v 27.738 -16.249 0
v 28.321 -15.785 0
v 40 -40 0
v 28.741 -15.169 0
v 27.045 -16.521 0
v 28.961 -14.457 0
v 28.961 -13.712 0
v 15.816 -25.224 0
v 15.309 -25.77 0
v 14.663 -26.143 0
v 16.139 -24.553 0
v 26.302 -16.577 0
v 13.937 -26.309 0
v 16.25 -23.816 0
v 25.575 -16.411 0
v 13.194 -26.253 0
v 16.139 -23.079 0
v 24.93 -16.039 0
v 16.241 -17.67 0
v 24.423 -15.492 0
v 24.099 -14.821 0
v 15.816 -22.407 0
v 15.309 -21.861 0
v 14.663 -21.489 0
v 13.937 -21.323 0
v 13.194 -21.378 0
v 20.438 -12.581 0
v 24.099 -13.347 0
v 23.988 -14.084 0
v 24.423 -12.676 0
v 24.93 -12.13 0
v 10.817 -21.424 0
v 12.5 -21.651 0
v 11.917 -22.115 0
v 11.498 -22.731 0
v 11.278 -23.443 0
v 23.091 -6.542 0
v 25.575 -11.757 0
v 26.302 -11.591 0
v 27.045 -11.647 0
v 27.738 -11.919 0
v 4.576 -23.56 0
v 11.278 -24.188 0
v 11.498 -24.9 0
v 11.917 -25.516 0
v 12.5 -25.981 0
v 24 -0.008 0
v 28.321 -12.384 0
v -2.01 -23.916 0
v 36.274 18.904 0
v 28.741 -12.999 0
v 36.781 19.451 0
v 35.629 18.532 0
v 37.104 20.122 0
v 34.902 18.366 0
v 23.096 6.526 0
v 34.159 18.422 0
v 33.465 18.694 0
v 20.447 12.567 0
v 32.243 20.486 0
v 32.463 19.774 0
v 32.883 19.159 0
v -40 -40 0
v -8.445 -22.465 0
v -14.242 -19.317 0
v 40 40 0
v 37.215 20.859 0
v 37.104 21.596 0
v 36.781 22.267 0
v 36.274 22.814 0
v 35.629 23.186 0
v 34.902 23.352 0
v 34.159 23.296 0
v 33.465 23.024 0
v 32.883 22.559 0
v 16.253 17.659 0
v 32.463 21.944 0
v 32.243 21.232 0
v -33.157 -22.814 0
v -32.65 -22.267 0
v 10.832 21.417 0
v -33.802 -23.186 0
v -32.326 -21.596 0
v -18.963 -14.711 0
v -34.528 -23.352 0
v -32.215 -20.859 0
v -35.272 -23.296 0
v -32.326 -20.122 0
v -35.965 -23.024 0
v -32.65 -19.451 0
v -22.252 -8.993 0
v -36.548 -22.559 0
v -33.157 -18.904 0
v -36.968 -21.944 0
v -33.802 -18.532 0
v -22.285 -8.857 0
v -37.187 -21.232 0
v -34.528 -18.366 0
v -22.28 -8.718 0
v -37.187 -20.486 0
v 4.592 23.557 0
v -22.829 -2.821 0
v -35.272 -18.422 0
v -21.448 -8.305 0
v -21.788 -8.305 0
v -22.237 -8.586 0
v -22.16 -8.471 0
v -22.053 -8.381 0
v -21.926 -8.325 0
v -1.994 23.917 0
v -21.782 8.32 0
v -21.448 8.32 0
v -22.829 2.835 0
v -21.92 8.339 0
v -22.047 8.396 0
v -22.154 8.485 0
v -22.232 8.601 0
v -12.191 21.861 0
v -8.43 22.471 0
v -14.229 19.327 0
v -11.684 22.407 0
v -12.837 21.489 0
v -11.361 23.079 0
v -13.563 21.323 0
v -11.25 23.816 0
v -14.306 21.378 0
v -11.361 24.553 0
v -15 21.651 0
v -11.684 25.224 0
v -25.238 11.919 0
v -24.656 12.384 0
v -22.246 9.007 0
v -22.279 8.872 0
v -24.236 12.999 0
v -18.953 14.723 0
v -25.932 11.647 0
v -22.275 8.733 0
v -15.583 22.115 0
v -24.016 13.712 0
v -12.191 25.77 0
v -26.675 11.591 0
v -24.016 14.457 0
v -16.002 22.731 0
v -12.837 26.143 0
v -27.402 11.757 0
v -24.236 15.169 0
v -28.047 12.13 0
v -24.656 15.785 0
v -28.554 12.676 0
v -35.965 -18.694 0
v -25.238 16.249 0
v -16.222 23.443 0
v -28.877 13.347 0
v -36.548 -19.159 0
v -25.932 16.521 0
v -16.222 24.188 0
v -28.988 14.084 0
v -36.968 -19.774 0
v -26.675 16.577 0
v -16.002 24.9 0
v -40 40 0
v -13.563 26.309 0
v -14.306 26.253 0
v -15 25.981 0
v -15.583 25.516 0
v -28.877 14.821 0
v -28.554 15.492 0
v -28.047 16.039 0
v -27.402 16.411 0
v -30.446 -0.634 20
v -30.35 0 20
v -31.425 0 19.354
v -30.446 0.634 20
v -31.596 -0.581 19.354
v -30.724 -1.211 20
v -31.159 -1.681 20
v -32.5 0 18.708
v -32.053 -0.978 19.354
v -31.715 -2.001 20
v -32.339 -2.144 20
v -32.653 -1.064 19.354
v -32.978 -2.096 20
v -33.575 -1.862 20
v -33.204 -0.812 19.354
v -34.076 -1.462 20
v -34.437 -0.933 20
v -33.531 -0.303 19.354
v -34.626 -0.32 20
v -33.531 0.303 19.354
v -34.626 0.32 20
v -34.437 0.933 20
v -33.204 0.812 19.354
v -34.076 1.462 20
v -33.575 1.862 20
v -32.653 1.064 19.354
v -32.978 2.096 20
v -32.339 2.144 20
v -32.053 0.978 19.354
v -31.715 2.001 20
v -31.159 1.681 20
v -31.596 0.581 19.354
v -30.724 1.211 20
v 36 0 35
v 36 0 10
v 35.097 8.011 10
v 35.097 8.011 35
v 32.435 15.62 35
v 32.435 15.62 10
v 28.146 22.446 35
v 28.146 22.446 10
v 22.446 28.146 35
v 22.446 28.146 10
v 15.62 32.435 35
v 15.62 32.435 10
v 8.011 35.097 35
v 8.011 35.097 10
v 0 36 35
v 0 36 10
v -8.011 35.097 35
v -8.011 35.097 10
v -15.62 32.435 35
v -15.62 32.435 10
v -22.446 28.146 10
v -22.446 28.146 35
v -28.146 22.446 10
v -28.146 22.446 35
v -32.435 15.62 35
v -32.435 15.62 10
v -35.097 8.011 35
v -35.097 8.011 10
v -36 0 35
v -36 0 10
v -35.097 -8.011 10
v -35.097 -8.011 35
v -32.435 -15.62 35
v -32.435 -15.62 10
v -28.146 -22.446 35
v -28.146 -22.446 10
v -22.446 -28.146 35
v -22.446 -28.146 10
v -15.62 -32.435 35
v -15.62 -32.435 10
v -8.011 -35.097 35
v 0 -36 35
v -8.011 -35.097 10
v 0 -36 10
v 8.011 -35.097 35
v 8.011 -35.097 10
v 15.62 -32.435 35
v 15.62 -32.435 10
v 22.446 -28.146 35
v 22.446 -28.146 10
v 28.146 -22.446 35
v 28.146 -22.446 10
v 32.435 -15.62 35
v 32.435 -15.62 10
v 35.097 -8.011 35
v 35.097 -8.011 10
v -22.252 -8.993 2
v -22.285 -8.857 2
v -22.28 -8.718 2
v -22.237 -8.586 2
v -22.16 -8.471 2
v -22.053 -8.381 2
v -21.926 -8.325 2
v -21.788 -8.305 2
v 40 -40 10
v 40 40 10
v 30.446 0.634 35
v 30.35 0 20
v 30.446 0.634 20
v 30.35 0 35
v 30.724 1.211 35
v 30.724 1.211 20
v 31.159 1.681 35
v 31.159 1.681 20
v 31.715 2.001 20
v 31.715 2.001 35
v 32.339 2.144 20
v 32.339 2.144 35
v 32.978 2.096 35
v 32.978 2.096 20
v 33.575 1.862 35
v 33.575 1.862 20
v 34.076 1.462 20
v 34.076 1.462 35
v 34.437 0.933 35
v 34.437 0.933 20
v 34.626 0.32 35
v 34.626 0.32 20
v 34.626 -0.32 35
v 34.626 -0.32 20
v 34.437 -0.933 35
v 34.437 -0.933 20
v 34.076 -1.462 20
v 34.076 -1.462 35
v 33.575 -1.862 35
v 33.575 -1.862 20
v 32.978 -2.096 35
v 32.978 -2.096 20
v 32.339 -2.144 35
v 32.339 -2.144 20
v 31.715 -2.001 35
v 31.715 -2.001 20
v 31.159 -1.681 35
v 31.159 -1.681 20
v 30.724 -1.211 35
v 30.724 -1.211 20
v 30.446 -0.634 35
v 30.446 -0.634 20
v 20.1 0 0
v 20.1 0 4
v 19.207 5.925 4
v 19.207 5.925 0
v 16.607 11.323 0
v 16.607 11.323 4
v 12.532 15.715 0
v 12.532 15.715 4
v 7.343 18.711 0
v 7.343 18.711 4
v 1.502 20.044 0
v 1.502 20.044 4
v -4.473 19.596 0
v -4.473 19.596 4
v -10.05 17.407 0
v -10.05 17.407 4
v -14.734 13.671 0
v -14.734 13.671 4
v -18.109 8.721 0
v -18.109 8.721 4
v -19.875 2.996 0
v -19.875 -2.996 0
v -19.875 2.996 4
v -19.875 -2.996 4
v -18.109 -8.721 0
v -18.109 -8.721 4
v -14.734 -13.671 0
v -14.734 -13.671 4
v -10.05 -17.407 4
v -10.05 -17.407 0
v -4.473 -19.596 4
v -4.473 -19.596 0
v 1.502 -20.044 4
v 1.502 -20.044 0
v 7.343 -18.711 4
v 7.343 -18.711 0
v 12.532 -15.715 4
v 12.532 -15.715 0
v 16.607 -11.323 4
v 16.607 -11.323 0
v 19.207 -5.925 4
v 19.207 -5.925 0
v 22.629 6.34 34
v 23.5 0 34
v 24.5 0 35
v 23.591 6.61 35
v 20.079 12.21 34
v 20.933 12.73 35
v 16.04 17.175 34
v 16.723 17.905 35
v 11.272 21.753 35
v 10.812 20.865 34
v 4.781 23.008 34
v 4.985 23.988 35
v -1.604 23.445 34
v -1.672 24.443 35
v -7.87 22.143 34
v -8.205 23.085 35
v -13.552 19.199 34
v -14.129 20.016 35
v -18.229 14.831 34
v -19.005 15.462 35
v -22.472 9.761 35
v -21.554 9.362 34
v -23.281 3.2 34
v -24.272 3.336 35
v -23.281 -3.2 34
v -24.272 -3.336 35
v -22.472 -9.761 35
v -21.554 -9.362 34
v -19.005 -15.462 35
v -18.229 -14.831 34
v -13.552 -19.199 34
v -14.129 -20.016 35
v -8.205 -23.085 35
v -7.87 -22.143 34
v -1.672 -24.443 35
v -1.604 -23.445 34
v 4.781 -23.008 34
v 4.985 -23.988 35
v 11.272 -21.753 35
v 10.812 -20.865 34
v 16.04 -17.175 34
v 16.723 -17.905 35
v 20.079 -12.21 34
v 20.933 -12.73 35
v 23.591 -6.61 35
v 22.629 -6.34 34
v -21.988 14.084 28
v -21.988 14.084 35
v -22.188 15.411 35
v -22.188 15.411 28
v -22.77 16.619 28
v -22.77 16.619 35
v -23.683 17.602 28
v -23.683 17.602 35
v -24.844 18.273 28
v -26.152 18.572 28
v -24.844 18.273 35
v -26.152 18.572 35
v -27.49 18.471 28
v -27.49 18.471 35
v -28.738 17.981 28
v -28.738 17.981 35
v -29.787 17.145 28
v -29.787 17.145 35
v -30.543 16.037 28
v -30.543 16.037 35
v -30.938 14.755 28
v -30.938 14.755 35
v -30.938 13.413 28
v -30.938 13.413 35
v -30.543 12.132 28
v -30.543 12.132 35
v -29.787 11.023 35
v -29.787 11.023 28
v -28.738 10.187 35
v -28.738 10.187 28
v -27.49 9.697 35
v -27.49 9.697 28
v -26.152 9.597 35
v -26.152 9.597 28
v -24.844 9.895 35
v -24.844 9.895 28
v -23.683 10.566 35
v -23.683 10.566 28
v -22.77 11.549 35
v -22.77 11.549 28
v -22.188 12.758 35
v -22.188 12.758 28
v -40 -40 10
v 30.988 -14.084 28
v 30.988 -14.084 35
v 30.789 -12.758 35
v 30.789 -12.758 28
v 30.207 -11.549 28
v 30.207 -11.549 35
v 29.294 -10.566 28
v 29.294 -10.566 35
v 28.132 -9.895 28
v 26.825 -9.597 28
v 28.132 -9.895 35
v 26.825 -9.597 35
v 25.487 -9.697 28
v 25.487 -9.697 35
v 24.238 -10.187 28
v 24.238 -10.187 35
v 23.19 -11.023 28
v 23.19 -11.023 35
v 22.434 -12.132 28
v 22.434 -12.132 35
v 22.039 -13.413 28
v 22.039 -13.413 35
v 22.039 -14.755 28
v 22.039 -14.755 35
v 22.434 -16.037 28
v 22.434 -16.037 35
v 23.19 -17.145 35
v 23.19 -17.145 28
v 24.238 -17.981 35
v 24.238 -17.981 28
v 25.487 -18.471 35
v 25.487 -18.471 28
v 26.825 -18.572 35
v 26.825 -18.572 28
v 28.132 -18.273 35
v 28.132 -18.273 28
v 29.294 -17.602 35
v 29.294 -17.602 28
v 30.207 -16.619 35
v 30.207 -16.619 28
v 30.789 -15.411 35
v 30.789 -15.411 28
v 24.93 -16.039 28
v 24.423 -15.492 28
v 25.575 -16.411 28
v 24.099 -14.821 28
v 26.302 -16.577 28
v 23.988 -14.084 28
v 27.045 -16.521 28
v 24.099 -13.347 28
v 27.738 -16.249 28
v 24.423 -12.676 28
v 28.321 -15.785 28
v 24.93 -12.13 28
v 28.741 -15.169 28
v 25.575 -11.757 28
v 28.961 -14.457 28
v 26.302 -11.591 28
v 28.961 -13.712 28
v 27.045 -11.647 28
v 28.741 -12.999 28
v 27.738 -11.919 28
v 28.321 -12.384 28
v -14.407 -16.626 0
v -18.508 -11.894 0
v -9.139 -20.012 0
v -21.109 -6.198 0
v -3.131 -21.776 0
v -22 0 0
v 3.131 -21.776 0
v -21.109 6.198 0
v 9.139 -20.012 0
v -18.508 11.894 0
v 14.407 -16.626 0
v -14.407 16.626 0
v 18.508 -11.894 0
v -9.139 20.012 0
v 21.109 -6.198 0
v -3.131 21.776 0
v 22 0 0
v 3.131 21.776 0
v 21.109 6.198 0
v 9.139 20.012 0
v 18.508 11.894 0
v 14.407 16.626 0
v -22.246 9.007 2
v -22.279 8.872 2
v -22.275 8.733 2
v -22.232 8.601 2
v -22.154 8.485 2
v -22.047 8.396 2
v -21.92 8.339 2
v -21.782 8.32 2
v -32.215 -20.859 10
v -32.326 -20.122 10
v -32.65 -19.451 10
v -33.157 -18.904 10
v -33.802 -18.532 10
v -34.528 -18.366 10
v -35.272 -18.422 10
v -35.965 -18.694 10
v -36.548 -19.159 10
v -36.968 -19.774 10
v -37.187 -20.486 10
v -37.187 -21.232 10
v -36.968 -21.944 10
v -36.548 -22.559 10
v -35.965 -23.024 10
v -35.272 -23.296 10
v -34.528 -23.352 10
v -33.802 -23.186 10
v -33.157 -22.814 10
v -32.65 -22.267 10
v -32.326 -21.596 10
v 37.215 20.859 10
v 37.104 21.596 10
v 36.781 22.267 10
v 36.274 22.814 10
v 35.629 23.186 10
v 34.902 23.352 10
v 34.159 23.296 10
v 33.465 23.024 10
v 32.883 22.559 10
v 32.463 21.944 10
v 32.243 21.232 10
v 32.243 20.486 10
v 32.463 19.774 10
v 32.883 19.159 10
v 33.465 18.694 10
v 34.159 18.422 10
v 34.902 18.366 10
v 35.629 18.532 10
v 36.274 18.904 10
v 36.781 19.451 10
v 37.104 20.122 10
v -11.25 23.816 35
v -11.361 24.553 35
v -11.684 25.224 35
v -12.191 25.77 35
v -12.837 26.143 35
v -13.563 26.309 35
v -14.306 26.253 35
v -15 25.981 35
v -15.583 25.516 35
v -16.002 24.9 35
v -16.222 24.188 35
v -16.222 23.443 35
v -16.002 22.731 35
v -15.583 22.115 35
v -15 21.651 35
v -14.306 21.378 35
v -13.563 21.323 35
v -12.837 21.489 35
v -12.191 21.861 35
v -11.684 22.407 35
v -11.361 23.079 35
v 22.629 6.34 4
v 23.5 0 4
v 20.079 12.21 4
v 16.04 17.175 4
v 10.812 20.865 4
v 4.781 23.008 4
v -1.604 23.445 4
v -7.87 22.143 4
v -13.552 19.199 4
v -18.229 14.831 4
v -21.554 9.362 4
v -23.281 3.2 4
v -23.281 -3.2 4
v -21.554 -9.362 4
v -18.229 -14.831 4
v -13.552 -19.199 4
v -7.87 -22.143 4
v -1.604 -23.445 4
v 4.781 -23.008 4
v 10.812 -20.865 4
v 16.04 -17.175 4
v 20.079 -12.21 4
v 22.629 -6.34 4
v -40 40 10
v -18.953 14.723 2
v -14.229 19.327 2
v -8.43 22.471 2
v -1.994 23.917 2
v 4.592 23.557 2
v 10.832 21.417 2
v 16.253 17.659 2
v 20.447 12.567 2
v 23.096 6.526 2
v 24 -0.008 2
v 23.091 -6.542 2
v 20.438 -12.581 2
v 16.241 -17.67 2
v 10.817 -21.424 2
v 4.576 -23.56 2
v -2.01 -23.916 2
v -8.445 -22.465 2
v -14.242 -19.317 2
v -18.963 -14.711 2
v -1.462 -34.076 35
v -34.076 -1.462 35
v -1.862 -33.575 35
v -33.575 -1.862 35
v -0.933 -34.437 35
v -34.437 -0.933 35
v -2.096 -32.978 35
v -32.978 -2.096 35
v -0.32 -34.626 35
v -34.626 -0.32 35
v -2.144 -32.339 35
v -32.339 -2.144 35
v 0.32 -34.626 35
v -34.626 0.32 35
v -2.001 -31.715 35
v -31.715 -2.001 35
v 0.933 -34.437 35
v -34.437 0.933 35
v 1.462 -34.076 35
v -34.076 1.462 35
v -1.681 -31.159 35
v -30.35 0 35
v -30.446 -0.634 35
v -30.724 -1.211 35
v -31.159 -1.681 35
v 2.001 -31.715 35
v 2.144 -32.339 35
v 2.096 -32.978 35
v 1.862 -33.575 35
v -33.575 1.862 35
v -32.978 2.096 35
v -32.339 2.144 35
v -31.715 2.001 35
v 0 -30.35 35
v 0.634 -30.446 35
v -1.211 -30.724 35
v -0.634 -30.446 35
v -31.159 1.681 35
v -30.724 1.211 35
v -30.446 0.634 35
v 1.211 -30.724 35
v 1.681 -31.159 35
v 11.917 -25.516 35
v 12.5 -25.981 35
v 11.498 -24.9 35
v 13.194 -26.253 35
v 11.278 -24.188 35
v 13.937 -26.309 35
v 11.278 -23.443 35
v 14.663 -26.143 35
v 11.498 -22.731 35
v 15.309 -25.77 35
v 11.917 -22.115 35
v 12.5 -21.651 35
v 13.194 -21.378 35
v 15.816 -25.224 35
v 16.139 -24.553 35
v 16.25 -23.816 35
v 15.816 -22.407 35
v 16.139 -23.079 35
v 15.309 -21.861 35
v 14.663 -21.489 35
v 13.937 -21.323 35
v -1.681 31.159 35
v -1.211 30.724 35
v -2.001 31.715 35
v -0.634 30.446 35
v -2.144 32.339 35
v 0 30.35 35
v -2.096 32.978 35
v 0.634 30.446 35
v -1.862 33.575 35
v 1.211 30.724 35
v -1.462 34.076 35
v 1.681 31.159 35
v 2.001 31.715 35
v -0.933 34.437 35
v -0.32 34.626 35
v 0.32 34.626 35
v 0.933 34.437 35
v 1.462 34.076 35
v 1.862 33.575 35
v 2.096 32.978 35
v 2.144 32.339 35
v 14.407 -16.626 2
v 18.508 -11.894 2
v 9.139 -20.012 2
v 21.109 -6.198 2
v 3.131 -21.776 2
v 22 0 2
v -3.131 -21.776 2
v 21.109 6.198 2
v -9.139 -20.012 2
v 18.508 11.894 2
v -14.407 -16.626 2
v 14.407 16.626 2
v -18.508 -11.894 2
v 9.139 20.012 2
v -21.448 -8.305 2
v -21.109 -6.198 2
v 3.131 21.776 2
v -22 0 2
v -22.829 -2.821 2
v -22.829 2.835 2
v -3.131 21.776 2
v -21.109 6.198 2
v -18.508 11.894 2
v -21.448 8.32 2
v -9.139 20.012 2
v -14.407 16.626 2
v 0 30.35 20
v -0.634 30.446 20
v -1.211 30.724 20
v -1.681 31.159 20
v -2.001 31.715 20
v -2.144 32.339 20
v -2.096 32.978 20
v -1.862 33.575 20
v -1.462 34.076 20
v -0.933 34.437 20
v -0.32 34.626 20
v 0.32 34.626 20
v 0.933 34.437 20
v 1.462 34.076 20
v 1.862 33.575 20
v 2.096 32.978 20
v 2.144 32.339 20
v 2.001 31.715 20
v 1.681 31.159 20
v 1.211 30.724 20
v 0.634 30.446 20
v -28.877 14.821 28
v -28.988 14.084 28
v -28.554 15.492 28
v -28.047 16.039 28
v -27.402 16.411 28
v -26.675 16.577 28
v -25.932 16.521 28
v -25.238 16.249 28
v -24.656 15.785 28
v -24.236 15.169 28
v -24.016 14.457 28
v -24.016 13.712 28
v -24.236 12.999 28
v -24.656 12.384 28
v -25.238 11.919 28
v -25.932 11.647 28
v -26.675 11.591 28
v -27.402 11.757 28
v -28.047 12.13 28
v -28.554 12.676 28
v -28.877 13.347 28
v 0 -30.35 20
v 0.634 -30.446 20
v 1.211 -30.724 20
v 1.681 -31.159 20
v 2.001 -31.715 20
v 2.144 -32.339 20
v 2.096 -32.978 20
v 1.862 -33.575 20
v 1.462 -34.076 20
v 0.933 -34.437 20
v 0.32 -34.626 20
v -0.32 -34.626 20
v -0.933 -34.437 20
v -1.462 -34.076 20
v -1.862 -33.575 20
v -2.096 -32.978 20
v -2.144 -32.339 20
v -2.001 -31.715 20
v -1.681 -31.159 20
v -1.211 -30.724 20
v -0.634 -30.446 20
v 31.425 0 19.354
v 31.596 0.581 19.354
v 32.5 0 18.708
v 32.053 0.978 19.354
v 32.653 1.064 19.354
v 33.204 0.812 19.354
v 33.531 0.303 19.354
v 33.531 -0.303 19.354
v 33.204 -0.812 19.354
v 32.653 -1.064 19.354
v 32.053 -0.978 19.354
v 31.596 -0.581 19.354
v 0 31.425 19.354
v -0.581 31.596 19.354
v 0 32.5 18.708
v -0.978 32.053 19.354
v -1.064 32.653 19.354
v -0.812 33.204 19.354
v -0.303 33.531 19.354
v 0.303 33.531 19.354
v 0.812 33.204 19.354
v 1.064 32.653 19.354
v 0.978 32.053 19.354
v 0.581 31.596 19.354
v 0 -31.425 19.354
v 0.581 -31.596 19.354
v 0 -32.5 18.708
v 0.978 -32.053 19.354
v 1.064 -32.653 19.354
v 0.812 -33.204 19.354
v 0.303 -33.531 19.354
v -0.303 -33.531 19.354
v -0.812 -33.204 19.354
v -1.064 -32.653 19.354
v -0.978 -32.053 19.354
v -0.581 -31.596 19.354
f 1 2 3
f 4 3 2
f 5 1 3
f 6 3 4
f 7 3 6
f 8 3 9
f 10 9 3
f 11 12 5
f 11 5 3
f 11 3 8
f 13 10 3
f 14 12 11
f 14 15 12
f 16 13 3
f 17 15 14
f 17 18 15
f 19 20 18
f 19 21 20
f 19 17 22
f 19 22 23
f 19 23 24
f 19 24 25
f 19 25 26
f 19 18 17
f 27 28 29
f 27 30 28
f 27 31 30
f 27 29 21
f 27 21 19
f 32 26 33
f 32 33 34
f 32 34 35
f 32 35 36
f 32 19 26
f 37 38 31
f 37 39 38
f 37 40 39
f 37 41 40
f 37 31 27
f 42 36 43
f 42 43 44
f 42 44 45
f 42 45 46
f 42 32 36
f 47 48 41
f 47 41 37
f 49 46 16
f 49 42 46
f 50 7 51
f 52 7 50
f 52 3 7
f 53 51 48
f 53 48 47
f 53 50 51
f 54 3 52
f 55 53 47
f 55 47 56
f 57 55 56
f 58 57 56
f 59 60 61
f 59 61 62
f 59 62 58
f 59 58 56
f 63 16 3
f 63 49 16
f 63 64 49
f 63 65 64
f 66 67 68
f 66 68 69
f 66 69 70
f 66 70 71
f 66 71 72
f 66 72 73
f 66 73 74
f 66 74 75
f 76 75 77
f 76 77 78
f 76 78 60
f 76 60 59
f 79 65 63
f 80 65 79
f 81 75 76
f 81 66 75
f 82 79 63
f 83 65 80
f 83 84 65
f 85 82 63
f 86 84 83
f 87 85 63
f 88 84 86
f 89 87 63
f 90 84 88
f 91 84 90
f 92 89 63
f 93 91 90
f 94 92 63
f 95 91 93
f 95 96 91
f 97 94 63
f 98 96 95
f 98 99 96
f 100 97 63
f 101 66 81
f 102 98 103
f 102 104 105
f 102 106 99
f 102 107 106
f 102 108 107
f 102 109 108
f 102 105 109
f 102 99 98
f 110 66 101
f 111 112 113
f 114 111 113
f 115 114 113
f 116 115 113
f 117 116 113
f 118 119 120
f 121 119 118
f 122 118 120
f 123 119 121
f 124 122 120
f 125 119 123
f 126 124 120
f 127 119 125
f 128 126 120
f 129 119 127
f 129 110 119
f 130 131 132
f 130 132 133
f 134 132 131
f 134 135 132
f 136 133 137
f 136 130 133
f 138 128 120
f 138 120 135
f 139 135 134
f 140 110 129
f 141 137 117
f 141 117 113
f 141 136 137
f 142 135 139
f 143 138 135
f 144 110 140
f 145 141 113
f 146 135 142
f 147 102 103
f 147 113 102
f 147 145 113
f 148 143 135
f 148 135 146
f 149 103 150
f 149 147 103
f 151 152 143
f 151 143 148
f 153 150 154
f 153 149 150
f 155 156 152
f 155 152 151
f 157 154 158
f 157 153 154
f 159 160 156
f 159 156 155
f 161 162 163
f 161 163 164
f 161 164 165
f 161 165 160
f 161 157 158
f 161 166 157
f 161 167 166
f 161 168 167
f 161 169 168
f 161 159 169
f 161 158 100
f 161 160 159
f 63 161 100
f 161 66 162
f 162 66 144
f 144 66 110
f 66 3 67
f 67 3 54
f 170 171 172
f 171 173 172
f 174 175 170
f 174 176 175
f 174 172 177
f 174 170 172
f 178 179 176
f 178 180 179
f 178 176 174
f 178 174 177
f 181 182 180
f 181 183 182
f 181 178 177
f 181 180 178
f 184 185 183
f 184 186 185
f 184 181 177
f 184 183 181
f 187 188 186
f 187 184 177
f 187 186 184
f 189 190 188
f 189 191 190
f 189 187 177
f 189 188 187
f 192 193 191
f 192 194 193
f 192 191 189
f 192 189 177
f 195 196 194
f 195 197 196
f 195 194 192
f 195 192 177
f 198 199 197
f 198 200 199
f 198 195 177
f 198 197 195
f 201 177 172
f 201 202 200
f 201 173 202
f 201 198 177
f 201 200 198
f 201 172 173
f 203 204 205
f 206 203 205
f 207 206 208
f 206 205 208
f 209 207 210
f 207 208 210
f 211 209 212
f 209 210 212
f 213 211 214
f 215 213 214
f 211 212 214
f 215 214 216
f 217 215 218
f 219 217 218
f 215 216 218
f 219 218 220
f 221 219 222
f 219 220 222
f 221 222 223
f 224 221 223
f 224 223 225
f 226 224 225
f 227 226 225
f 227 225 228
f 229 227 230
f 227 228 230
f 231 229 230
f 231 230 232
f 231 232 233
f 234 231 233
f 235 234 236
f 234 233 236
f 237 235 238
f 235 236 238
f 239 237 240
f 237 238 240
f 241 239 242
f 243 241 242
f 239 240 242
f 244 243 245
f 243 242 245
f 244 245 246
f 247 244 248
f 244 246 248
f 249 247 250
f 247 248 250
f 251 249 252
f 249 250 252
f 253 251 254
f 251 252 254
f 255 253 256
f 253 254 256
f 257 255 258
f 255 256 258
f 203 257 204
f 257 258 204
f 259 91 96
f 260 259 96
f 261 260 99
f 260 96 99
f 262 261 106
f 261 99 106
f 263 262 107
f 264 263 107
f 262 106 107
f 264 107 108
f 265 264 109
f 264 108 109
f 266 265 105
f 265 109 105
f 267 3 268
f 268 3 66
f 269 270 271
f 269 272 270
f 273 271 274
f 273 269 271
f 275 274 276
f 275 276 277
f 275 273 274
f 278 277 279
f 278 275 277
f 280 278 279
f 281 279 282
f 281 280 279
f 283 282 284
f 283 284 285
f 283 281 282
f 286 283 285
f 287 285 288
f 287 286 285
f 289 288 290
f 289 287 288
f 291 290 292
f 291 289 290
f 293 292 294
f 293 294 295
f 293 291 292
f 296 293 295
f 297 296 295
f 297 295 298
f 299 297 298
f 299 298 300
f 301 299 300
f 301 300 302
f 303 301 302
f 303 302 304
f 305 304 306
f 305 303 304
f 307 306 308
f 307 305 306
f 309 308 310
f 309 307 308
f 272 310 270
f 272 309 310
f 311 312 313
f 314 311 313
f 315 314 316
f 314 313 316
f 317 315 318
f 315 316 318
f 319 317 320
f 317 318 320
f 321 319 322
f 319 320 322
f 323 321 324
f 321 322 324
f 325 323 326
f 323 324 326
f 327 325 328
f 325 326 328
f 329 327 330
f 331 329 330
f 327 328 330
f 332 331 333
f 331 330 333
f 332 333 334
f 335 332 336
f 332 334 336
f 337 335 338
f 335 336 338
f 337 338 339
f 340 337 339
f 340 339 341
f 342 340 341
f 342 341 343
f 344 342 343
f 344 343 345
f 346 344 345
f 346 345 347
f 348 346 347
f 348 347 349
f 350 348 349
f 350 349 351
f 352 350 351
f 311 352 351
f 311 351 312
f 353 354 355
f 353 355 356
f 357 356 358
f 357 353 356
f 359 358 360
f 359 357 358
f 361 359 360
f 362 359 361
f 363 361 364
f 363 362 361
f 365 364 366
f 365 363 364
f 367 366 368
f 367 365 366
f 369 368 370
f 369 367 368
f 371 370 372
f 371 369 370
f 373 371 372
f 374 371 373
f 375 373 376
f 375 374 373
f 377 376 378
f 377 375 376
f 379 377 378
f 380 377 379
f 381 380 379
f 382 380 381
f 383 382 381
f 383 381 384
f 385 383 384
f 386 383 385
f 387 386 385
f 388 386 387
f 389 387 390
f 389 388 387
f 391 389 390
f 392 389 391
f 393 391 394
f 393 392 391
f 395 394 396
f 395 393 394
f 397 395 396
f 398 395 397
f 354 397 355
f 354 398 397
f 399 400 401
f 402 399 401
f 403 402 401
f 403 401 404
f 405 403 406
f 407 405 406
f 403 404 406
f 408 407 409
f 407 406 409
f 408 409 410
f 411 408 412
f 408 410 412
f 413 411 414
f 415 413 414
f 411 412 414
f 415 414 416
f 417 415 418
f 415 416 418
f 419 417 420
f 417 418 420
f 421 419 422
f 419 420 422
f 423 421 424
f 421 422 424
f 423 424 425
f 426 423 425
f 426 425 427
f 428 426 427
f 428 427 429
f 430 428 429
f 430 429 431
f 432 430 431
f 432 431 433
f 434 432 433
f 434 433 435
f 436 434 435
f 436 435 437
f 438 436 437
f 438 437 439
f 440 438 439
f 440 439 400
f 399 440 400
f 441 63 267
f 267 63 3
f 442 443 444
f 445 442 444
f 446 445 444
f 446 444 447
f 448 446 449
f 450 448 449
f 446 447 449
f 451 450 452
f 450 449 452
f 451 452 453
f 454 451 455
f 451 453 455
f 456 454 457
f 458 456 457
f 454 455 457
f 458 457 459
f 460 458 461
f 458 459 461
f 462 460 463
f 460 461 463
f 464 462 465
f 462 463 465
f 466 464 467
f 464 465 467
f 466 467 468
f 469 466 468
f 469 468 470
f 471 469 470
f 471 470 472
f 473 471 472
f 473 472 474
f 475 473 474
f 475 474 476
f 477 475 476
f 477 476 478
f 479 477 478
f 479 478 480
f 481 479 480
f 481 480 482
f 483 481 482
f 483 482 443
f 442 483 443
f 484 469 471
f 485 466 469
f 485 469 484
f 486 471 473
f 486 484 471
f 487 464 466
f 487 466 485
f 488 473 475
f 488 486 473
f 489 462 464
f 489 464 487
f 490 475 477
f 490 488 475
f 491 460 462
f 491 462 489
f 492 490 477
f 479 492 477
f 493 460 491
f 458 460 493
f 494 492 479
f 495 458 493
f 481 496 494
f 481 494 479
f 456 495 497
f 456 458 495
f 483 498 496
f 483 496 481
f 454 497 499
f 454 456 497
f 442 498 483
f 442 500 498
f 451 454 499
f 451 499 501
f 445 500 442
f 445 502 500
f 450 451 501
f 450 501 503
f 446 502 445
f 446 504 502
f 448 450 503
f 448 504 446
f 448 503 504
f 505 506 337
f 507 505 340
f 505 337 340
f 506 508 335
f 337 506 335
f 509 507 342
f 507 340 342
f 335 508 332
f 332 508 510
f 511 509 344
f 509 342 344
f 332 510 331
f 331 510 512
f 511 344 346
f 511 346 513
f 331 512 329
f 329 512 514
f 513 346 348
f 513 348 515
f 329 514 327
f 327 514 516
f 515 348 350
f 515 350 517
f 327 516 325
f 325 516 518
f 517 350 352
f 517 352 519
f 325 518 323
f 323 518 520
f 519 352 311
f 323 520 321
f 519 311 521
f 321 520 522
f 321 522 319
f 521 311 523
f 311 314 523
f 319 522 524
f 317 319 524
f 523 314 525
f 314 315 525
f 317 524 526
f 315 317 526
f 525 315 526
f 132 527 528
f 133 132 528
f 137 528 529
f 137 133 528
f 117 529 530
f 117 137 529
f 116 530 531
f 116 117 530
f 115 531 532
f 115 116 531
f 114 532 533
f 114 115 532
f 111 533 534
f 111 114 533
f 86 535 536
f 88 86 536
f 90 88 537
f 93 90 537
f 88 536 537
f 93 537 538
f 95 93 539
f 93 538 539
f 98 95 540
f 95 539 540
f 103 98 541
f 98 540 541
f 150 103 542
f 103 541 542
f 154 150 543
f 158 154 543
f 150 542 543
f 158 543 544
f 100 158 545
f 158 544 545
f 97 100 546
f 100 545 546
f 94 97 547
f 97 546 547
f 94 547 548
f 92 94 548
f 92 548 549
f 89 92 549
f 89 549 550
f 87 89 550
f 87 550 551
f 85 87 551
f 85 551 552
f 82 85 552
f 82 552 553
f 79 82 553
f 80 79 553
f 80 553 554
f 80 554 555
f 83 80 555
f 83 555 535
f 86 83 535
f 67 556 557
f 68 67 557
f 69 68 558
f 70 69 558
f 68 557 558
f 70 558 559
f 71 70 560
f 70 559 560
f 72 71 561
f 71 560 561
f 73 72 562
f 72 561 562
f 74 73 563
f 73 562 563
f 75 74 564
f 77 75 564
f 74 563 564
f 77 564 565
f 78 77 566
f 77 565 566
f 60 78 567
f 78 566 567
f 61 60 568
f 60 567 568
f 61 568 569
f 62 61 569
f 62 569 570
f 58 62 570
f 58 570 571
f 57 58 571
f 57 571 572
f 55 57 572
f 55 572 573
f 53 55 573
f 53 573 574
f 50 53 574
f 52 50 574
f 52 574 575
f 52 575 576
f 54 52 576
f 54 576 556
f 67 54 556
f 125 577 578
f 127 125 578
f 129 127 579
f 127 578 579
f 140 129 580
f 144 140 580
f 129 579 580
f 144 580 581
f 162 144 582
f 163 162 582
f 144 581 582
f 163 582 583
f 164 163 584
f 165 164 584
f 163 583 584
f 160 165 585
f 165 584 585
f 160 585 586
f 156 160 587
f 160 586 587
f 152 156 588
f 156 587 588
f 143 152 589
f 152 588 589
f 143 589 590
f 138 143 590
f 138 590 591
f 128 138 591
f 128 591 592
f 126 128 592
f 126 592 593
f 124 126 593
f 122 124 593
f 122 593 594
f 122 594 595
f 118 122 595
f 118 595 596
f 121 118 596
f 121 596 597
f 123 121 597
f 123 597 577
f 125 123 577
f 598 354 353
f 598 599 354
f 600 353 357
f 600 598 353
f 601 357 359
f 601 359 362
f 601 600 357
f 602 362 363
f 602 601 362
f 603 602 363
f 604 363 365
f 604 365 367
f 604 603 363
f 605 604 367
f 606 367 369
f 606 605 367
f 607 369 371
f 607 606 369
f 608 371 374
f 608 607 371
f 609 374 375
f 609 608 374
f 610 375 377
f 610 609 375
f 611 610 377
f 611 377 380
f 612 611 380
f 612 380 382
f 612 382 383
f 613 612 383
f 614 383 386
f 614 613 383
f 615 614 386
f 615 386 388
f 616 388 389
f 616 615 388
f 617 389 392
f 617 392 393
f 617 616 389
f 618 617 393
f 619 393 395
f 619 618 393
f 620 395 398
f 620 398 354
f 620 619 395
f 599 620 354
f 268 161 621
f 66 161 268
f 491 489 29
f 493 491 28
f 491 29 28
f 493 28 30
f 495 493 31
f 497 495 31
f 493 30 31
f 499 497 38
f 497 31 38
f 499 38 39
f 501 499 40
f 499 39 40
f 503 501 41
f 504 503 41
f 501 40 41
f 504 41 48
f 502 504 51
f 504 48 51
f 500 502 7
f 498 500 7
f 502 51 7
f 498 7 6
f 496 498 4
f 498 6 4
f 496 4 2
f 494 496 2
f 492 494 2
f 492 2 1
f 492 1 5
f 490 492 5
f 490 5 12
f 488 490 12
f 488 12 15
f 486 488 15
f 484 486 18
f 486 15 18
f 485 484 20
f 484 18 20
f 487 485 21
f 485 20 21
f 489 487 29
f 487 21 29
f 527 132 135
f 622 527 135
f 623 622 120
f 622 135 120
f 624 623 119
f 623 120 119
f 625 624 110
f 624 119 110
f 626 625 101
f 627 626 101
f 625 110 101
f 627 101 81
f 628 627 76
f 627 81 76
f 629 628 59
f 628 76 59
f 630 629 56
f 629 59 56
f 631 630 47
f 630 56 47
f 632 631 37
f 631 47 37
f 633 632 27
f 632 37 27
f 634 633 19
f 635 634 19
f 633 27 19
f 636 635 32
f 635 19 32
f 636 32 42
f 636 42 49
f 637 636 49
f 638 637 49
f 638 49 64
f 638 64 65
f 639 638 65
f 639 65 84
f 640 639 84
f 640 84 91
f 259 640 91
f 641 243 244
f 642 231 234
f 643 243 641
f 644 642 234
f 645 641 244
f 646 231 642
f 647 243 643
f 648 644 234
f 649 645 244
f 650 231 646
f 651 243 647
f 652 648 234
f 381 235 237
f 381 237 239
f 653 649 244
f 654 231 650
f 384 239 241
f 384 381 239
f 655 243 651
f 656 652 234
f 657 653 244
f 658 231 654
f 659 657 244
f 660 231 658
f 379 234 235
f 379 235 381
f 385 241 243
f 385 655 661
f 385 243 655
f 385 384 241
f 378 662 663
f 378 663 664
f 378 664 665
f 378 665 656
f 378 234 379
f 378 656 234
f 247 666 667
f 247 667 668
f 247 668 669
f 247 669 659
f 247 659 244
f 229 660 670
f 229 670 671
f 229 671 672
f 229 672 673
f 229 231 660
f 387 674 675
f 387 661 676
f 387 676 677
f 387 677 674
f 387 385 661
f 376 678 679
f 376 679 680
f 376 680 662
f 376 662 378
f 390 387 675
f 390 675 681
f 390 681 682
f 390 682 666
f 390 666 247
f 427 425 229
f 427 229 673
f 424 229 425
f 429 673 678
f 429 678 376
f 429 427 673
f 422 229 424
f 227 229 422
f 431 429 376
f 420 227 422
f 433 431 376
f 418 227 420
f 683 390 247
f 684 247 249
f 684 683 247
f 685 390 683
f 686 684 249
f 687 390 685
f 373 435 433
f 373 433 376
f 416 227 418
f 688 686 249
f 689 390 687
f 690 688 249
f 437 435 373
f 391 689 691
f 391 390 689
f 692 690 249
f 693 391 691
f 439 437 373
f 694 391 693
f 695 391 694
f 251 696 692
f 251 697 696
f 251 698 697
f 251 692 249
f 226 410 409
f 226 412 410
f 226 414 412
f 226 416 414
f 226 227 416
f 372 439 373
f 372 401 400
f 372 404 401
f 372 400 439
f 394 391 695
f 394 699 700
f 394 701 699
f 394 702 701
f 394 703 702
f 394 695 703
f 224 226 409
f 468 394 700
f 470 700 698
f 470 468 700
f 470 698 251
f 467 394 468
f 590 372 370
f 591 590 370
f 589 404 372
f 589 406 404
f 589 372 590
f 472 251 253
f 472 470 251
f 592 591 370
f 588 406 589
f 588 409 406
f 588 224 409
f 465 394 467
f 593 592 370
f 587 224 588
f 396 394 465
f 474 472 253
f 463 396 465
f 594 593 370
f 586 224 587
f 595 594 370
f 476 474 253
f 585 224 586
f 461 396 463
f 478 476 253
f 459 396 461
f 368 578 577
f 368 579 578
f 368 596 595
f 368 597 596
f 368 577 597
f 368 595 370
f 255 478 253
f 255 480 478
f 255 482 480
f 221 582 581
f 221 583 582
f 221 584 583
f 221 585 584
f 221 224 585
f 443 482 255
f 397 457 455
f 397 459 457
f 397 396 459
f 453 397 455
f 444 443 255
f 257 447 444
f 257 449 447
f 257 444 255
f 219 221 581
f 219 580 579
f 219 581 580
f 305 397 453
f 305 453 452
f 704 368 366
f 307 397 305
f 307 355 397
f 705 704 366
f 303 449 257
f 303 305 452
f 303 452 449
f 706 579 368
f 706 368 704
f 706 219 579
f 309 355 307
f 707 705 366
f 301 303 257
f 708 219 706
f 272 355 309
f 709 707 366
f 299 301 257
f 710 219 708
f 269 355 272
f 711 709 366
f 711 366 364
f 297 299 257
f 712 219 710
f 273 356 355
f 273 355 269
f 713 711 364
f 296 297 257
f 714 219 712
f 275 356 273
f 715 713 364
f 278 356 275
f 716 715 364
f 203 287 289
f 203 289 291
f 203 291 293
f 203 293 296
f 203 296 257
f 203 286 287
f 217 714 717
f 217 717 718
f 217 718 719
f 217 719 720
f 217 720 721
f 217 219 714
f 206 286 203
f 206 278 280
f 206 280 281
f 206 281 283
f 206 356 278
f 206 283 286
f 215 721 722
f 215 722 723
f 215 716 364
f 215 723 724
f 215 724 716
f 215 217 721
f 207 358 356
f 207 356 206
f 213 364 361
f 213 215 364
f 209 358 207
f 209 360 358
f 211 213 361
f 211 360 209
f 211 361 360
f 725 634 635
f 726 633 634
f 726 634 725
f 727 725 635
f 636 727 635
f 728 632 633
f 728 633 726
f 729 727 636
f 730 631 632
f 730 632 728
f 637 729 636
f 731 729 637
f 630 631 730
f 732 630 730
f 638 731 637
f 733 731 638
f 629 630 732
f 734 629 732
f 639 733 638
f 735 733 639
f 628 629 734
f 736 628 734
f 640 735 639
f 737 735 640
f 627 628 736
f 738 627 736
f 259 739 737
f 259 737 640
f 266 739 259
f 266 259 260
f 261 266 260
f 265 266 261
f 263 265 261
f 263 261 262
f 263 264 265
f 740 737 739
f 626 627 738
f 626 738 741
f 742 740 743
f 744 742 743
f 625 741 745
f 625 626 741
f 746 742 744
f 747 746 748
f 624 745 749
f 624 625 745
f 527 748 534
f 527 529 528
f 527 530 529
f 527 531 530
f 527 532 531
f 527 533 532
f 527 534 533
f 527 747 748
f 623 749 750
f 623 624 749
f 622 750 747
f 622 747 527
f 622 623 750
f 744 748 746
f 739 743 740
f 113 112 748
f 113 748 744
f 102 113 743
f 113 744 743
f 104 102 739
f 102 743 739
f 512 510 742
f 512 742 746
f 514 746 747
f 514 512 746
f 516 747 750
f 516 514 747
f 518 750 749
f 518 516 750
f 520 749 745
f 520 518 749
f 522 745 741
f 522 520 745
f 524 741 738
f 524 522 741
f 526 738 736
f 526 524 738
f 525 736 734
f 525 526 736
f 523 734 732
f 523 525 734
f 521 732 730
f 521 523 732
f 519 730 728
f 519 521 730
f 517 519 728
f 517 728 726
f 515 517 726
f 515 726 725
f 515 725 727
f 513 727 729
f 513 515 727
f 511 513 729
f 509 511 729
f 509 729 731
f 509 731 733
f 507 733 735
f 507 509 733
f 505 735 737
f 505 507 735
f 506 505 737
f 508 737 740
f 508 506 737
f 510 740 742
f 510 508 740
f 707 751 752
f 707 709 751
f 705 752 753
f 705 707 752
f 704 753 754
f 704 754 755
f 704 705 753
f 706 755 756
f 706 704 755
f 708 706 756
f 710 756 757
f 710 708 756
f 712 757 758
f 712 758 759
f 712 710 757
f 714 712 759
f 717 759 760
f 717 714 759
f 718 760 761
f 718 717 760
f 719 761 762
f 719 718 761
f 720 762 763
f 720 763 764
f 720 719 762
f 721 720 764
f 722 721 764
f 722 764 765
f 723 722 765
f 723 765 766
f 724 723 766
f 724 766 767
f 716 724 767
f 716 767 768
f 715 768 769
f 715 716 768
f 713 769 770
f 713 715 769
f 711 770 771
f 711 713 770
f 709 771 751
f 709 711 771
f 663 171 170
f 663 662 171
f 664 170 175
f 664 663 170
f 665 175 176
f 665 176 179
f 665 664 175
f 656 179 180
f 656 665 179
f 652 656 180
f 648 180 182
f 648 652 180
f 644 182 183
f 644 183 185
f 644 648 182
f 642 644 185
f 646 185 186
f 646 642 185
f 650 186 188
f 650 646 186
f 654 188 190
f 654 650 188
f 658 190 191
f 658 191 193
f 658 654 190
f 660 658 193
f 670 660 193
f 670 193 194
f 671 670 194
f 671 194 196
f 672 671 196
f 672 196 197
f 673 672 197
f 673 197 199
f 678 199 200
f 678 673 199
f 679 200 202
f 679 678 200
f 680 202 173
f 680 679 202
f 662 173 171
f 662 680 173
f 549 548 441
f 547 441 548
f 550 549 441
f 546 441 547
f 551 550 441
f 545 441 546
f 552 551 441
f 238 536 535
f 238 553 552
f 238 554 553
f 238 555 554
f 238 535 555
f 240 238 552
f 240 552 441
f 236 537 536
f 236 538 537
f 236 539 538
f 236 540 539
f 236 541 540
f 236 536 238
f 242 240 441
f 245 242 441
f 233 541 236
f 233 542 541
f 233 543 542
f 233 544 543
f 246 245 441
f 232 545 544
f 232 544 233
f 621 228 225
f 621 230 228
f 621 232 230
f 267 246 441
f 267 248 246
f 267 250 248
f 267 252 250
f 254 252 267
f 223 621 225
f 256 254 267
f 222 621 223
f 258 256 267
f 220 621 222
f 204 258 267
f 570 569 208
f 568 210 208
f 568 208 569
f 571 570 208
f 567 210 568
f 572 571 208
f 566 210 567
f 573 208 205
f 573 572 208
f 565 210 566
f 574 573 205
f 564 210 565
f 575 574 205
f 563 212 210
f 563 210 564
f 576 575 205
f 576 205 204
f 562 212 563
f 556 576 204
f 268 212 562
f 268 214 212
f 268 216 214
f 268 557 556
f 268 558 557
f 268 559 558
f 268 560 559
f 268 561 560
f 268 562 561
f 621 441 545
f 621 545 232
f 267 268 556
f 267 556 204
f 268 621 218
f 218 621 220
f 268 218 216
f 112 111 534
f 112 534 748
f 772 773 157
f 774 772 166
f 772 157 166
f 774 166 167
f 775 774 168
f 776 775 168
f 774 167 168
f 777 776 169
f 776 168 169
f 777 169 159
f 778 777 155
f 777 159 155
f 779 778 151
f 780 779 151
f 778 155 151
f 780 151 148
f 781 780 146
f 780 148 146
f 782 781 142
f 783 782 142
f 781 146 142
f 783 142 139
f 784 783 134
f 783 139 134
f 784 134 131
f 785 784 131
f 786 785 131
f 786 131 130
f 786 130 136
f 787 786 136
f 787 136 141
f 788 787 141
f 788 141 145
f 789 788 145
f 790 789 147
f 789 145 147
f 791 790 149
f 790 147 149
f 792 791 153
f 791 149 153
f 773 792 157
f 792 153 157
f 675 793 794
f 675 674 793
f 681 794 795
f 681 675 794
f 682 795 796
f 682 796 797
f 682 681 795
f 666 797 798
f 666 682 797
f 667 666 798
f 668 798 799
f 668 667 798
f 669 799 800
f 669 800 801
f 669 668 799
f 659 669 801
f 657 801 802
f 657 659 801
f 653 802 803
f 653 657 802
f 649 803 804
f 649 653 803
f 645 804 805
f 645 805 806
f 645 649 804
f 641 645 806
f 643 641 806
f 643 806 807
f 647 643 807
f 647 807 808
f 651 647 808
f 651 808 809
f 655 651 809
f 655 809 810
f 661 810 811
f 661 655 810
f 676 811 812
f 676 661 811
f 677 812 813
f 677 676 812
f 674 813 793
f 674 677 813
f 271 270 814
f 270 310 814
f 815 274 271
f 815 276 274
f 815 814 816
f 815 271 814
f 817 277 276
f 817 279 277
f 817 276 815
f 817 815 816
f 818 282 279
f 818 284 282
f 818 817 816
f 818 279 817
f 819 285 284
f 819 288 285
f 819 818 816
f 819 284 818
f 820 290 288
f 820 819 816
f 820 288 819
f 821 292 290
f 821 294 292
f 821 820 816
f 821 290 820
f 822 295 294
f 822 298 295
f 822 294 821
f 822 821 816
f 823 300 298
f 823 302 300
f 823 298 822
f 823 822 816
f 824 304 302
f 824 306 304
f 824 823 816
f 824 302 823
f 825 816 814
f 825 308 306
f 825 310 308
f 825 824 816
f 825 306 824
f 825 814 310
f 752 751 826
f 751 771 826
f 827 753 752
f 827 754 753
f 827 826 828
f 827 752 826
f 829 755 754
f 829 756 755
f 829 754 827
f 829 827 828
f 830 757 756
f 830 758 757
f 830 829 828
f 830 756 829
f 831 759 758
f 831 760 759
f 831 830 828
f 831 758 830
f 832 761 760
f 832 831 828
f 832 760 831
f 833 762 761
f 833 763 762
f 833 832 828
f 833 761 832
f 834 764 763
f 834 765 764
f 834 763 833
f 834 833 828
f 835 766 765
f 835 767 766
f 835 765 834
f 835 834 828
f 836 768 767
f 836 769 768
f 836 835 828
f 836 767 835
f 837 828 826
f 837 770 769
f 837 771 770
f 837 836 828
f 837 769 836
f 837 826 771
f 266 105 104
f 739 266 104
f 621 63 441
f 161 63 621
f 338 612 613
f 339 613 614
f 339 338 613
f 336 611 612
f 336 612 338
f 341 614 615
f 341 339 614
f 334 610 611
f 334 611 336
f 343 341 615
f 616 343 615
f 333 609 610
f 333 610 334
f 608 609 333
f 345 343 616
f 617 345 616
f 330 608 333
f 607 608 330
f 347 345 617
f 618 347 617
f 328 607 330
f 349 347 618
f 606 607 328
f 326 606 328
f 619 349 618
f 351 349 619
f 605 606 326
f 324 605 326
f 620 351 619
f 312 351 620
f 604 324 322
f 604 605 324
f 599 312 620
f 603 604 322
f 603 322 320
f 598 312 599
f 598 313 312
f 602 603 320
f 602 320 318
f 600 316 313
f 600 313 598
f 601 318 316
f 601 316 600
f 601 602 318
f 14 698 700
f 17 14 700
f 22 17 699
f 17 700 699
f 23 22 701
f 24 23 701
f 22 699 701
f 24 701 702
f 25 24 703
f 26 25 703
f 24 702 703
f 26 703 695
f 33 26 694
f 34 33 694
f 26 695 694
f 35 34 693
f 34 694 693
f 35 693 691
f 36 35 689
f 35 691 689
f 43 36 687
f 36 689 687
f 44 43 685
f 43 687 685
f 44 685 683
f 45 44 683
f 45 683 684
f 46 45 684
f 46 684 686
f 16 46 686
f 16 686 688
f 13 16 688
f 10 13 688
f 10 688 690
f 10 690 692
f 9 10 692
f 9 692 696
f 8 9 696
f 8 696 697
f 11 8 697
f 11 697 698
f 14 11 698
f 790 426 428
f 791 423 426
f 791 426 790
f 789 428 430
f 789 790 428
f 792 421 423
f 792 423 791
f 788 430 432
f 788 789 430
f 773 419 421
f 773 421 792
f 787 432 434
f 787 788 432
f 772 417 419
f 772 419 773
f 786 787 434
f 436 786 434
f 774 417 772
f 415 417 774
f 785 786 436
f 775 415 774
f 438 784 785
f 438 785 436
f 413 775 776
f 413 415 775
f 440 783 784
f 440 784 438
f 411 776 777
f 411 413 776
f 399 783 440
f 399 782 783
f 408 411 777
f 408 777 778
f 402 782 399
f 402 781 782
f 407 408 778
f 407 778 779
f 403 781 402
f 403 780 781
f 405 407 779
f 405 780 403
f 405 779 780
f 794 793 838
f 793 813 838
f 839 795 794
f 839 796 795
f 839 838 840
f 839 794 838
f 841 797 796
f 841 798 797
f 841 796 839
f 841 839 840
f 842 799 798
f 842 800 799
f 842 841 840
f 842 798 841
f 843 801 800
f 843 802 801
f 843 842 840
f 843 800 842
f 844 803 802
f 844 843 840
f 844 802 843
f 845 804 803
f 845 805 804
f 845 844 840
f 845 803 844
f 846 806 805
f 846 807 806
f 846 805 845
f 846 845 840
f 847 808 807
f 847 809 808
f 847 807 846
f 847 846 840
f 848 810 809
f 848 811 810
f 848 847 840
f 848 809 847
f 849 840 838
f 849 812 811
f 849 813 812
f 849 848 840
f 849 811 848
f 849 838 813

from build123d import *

# Parameters (mm, degrees)
SKIZZE1_W                                            = 80
SKIZZE1_H                                            = 80
AUFSATZ_LINEAR_AUSTRAGEN1_DEPTH                      = 10
SKIZZE16_R                                           = 20.1
SCHNITT_LINEAR_AUSTRAGEN1_DEPTH                      = 11
SKIZZE17_R                                           = 36
SKIZZE17_R_2                                         = 23.5
AUFSATZ_LINEAR_AUSTRAGEN2_DEPTH                      = 25
KREISMUSTER1_COUNT                                   = 4
FASE1_SIZE                                           = 1
F_5_0_5_DURCHMESSER_BOHRUNG1_D                       = 5
STIRNSENKUNG_F_R_M5_ZYLINDERSCHRAUBE_MIT_D           = 5
STIRNSENKUNG_F_R_M5_ZYLINDERSCHRAUBE_MIT_CBORE_D     = 9
STIRNSENKUNG_F_R_M5_ZYLINDERSCHRAUBE_MIT_CBORE_DEPTH = 7
SKIZZE39_R                                           = 23.5
SKIZZE39_R_2                                         = 20.1
SCHNITT_LINEAR_AUSTRAGEN2_DEPTH                      = 6
SKIZZE40_R                                           = 24
SKIZZE40_R_2                                         = 22
SCHNITT_LINEAR_AUSTRAGEN3_DEPTH                      = 2
AUFSATZ_LINEAR_AUSTRAGEN3_DEPTH                      = 2
SCHNITT_LINEAR_AUSTRAGEN4_DEPTH                      = 2


with BuildPart() as part:
    # Skizze1 → Aufsatz-Linear austragen1 (new body)
    with BuildSketch(Plane.XY):
        Rectangle(SKIZZE1_W, SKIZZE1_H)
    extrude(amount=AUFSATZ_LINEAR_AUSTRAGEN1_DEPTH)

    # Skizze16 → Schnitt-Linear austragen1 (cut, through all)
    with BuildSketch(Plane.XY.offset(10)):
        Circle(SKIZZE16_R)
    extrude(amount=-SCHNITT_LINEAR_AUSTRAGEN1_DEPTH, mode=Mode.SUBTRACT)

    # Skizze17 → Aufsatz-Linear austragen2 (add)
    with BuildSketch(Plane.XY.offset(10)):
        Circle(SKIZZE17_R)
        Circle(SKIZZE17_R_2, mode=Mode.SUBTRACT)
    extrude(amount=AUFSATZ_LINEAR_AUSTRAGEN2_DEPTH)

    # Skizze21 → Ø4.3 (4.3) Durchmesser Bohrung1 (revolve, cut)
    with BuildSketch(Plane(origin=(0, 32.5, 35), x_dir=(0, -1, 0), z_dir=(1, 0, 0))):
        Polygon((0, 0), (0, 16.291850331), (2.15, 15), (2.15, 0), align=None)
    f_4_3_4_3_durchmesser_bohrung1 = revolve(axis=Axis((0, 32.5, 41.35), (0, 0, -1)), mode=Mode.SUBTRACT)

    # Kreismuster1: Ø4.3 (4.3) Durchmesser Bohrung1 ×4 about axis
    kreismuster1_axis = Axis((0, 0, 0), (0, 0, 1))
    for i in range(1, KREISMUSTER1_COUNT):
        add(f_4_3_4_3_durchmesser_bohrung1.rotate(kreismuster1_axis, i * 360 / KREISMUSTER1_COUNT), mode=Mode.SUBTRACT)

    # Fase1
    fase1_edges = [part.edges().sort_by_distance(p)[0] for p in [
        (-23.5, 0, 35),
    ]]
    chamfer(fase1_edges, length=FASE1_SIZE)

    # Ø5.0 (5) Durchmesser Bohrung1 (through all)
    with Locations(Plane(origin=(0, 0, 0), x_dir=(-1, 0, 0), z_dir=(0, 0, -1))):
        with Locations((34.715275678, -20.859042034), (-13.75, -23.815698604), (13.75, 23.815698604), (-34.715275678, 20.859042034)):
            Hole(F_5_0_5_DURCHMESSER_BOHRUNG1_D / 2)

    # Stirnsenkung für M5 Zylinderschraube mit Innensechskant1 (through all)
    with Locations(Plane.XY.offset(35)):
        with Locations((-26.488427786, 14.084146884), (26.488427786, -14.084146884)):
            CounterBoreHole(STIRNSENKUNG_F_R_M5_ZYLINDERSCHRAUBE_MIT_D / 2, STIRNSENKUNG_F_R_M5_ZYLINDERSCHRAUBE_MIT_CBORE_D / 2, STIRNSENKUNG_F_R_M5_ZYLINDERSCHRAUBE_MIT_CBORE_DEPTH)

    # Skizze39 → Schnitt-Linear austragen2 (cut)
    with BuildSketch(Plane.XY.offset(10)):
        Circle(SKIZZE39_R)
        Circle(SKIZZE39_R_2, mode=Mode.SUBTRACT)
    extrude(amount=-SCHNITT_LINEAR_AUSTRAGEN2_DEPTH, mode=Mode.SUBTRACT)

    # Skizze40 → Schnitt-Linear austragen3 (cut)
    with BuildSketch(Plane(origin=(0, 0, 0), x_dir=(-1, 0, 0), z_dir=(0, 0, -1))):
        Circle(SKIZZE40_R)
        Circle(SKIZZE40_R_2, mode=Mode.SUBTRACT)
    extrude(amount=-SCHNITT_LINEAR_AUSTRAGEN3_DEPTH, mode=Mode.SUBTRACT)

    # Skizze41 → Aufsatz-Linear austragen3 (add)
    with BuildSketch(Plane(origin=(0, 0, 2), x_dir=(-1, 0, 0), z_dir=(0, 0, -1))):
        with BuildLine():
            Line((21.16903947, -8.992508512), (22.25162445, -8.992508512))
            ThreePointArc((22.25162445, -8.992508512), (24.003029137, 0.007491459), (22.251624746, 9.007491488))
            Line((22.251624746, 9.007491488), (21.169039781, 9.007491488))
            ThreePointArc((21.169039781, 9.007491488), (23.003029137, 0.007491456), (21.16903947, -8.992508512))
        make_face()
    extrude(amount=AUFSATZ_LINEAR_AUSTRAGEN3_DEPTH)

    # Skizze42 → Schnitt-Linear austragen4 (cut)
    with BuildSketch(Plane(origin=(0, 0, 0), x_dir=(-1, 0, 0), z_dir=(0, 0, -1))):
        with BuildLine():
            Line((21.431430131, -8.305164585), (21.16903947, -8.992508512))
            Line((21.16903947, -8.992508512), (21.324473431, -8.992508512))
            ThreePointArc((21.324473431, -8.992508512), (22.202579979, -9.084742871), (21.788048941, -8.305164585))
            Line((21.788048941, -8.305164585), (21.431430131, -8.305164585))
        make_face()
        with BuildLine():
            Line((21.782114297, 8.319835415), (21.431430131, 8.319835415))
            Line((21.431430131, 8.319835415), (21.169039781, 9.007491488))
            Line((21.169039781, 9.007491488), (21.318665057, 9.007491488))
            ThreePointArc((21.318665057, 9.007491488), (22.196739451, 9.099274106), (21.782114297, 8.319835415))
        make_face()
    extrude(amount=-SCHNITT_LINEAR_AUSTRAGEN4_DEPTH, mode=Mode.SUBTRACT)


solid = part.part
